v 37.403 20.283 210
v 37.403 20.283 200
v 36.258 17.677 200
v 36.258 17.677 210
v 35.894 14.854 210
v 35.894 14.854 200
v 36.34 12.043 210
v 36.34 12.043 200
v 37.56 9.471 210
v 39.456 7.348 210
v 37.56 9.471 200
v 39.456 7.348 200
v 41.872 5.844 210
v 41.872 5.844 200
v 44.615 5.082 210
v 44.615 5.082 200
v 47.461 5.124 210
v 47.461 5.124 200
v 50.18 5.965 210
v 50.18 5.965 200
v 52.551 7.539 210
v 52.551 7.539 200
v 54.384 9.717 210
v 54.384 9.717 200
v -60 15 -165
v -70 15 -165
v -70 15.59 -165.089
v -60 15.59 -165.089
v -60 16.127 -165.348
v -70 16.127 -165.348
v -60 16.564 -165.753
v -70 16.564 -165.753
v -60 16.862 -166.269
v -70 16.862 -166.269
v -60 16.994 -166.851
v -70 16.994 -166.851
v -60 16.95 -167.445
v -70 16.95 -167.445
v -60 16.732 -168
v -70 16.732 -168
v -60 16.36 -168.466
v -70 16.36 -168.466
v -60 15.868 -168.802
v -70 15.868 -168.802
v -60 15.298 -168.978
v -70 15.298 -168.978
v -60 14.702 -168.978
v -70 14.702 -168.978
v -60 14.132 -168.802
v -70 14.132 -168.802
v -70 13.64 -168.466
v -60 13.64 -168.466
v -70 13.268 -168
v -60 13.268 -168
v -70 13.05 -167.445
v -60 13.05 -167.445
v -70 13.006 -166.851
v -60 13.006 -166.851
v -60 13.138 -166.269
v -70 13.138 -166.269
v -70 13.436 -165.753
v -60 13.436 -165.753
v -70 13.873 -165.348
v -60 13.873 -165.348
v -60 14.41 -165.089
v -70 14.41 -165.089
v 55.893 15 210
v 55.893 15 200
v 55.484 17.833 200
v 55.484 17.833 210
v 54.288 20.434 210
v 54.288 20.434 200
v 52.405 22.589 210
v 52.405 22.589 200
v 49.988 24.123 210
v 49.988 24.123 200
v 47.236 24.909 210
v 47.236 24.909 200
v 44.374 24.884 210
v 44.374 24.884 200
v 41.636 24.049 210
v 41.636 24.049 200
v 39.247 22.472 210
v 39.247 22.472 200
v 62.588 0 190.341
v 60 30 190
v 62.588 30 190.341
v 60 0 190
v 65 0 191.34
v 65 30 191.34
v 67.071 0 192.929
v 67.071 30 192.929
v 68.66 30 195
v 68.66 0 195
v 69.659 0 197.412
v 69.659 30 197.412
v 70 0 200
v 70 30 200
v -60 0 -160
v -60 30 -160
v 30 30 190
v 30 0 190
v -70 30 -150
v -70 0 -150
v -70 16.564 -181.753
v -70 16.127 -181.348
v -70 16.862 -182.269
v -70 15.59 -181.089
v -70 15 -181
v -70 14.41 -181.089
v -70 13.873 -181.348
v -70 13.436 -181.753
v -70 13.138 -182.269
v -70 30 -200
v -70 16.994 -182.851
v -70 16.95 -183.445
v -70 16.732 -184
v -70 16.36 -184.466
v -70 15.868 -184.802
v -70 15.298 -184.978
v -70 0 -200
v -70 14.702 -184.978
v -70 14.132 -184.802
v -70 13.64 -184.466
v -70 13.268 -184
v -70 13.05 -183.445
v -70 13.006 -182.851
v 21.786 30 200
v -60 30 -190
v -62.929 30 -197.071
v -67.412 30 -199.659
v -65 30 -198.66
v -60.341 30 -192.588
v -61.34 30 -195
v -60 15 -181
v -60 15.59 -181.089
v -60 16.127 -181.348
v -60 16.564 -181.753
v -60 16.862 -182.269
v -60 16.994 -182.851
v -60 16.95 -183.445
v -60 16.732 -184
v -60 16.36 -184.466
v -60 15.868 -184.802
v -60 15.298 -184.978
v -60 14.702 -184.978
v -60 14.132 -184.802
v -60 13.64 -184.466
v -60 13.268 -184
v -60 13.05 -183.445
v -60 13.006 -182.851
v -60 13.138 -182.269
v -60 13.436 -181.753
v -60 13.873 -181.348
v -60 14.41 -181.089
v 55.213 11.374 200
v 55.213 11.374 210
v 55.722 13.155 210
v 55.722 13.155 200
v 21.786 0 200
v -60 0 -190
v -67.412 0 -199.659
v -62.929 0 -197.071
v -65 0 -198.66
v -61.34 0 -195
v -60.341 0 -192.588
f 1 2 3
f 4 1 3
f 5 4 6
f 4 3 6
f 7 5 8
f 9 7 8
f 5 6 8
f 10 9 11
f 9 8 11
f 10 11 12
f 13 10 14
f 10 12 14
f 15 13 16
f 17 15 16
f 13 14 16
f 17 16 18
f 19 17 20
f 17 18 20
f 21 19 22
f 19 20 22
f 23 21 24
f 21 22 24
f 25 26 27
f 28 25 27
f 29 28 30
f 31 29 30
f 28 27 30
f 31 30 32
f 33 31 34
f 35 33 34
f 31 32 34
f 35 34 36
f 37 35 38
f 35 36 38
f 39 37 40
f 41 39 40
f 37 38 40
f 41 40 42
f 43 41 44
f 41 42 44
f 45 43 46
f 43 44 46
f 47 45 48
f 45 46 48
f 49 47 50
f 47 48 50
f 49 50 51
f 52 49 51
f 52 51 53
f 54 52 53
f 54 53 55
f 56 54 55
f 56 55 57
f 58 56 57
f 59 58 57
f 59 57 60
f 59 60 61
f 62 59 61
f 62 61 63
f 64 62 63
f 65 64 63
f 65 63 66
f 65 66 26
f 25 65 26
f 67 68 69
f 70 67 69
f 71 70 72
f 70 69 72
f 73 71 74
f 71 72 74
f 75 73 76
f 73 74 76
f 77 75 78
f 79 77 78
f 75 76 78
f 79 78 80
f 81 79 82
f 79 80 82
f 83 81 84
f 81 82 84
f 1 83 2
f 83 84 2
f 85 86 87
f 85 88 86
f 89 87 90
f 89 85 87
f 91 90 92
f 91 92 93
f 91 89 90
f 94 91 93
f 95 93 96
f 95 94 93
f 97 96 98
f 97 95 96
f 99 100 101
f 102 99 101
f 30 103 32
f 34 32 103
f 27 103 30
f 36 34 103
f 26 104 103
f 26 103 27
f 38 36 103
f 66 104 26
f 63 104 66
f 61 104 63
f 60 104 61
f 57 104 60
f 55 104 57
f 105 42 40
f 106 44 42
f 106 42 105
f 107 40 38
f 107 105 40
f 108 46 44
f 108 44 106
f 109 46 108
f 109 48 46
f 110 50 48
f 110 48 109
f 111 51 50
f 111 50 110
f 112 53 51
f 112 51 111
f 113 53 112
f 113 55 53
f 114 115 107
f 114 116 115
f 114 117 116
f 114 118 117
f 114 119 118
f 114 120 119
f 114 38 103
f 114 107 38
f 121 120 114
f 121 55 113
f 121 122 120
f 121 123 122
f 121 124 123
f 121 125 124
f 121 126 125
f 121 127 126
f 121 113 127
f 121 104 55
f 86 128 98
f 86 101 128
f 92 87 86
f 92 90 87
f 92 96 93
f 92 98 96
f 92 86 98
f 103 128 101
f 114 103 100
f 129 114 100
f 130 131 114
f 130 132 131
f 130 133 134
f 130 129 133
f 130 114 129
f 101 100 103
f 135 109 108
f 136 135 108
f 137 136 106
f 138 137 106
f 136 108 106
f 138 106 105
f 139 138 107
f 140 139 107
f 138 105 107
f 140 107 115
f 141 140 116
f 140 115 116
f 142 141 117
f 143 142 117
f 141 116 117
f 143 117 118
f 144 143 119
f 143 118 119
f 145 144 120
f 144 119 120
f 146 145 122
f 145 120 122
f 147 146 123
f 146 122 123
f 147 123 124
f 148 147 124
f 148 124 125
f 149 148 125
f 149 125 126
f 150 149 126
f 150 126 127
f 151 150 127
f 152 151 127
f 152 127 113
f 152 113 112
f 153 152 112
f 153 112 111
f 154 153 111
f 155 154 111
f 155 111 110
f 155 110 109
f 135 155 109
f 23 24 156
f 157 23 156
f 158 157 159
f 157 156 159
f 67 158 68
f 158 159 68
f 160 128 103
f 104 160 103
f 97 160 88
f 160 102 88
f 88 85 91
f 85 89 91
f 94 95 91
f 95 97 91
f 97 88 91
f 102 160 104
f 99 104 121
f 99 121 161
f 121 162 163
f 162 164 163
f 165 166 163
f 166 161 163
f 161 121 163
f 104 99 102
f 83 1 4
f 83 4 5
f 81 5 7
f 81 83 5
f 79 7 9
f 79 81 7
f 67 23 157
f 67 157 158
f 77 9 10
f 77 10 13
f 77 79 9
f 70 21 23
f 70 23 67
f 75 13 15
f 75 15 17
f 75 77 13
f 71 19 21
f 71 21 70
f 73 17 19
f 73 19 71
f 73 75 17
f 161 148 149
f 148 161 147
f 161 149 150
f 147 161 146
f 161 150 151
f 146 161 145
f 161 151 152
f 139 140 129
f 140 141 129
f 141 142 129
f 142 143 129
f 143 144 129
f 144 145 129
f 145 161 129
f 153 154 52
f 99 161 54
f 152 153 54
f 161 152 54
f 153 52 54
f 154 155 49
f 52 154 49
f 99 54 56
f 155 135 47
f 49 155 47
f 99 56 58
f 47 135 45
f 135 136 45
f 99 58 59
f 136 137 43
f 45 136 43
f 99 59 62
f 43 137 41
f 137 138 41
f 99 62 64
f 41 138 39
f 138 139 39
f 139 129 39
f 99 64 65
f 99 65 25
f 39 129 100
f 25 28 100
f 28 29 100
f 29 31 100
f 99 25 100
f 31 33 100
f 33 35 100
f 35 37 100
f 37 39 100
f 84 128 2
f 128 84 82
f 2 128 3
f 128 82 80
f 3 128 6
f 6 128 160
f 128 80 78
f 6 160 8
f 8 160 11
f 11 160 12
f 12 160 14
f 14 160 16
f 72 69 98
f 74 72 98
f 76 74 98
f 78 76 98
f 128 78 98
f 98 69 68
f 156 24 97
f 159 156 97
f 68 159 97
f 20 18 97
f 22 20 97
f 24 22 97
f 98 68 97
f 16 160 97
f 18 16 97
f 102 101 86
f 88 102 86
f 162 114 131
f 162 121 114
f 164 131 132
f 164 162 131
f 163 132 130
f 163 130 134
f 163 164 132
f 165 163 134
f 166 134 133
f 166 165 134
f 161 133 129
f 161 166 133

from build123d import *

# Parameters (mm, degrees)
ESQUISSE1_W             = 140
ESQUISSE1_H             = 400
BOSS_EXTRU_1_DEPTH      = 30
ENL_V_MAT_EXTRU_2_DEPTH = 30
ESQUISSE3_R             = 2
ENL_V_MAT_EXTRU_3_DEPTH = 246.967477525
BOSS_EXTRU_3_DEPTH      = 10
CONG_1_R                = 10
CONG_2_R                = 10


with BuildPart() as part:
    # Esquisse1 → Boss.-Extru.1 (new body)
    with BuildSketch(Plane(origin=(0, 0, 0), x_dir=(1, 0, 0), z_dir=(0, 1, 0))):
        Rectangle(ESQUISSE1_W, ESQUISSE1_H)
    extrude(amount=BOSS_EXTRU_1_DEPTH)

    # Esquisse2 → Enlèv. mat.-Extru.2 (cut)
    with BuildSketch(Plane(origin=(0, 30, 0), x_dir=(1, 0, 0), z_dir=(0, 1, 0))):
        Polygon((21.786415215, -200), (-70, 150), (-70, -200), align=None)
        Polygon((70, 200), (-60, 200), (-60, 160), (30, -190), (70, -190), align=None)
    extrude(amount=-ENL_V_MAT_EXTRU_2_DEPTH, mode=Mode.SUBTRACT)

    # Esquisse3 → Enlèv. mat.-Extru.3 (cut, through all)
    with BuildSketch(Plane.ZY.offset(70)):
        with Locations((-183, 15)):
            Circle(ESQUISSE3_R)
        with Locations((-167, 15)):
            Circle(ESQUISSE3_R)
    extrude(amount=-ENL_V_MAT_EXTRU_3_DEPTH, mode=Mode.SUBTRACT)

    # Esquisse4 → Boss.-Extru.3 (add)
    with BuildSketch(Plane.XY.offset(200)):
        with BuildLine():
            ThreePointArc((55.893207608, 15), (48.640450238, 24.615230519), (37.402676021, 20.283074236))
            Line((37.402676021, 20.283074236), (54.383739194, 9.716925764))
            ThreePointArc((54.383739194, 9.716925764), (55.508438127, 12.25275737), (55.893207608, 15))
        make_face()
        with BuildLine():
            Line((54.383739194, 9.716925764), (37.402676021, 20.283074236))
            ThreePointArc((37.402676021, 20.283074236), (40.610133372, 6.509468414), (54.383739194, 9.716925764))
        make_face()
    extrude(amount=BOSS_EXTRU_3_DEPTH)

    # Congé1
    cong_1_edges = [part.edges().sort_by_distance(p)[0] for p in [
        (-60, 15, -200),
    ]]
    fillet(cong_1_edges, radius=CONG_1_R - 0.0001)  # a hair under: the kernel refuses the full size

    # Congé2
    cong_2_edges = [part.edges().sort_by_distance(p)[0] for p in [
        (70, 15, 190),
    ]]
    fillet(cong_2_edges, radius=CONG_2_R - 0.0001)  # a hair under: the kernel refuses the full size


solid = part.part
